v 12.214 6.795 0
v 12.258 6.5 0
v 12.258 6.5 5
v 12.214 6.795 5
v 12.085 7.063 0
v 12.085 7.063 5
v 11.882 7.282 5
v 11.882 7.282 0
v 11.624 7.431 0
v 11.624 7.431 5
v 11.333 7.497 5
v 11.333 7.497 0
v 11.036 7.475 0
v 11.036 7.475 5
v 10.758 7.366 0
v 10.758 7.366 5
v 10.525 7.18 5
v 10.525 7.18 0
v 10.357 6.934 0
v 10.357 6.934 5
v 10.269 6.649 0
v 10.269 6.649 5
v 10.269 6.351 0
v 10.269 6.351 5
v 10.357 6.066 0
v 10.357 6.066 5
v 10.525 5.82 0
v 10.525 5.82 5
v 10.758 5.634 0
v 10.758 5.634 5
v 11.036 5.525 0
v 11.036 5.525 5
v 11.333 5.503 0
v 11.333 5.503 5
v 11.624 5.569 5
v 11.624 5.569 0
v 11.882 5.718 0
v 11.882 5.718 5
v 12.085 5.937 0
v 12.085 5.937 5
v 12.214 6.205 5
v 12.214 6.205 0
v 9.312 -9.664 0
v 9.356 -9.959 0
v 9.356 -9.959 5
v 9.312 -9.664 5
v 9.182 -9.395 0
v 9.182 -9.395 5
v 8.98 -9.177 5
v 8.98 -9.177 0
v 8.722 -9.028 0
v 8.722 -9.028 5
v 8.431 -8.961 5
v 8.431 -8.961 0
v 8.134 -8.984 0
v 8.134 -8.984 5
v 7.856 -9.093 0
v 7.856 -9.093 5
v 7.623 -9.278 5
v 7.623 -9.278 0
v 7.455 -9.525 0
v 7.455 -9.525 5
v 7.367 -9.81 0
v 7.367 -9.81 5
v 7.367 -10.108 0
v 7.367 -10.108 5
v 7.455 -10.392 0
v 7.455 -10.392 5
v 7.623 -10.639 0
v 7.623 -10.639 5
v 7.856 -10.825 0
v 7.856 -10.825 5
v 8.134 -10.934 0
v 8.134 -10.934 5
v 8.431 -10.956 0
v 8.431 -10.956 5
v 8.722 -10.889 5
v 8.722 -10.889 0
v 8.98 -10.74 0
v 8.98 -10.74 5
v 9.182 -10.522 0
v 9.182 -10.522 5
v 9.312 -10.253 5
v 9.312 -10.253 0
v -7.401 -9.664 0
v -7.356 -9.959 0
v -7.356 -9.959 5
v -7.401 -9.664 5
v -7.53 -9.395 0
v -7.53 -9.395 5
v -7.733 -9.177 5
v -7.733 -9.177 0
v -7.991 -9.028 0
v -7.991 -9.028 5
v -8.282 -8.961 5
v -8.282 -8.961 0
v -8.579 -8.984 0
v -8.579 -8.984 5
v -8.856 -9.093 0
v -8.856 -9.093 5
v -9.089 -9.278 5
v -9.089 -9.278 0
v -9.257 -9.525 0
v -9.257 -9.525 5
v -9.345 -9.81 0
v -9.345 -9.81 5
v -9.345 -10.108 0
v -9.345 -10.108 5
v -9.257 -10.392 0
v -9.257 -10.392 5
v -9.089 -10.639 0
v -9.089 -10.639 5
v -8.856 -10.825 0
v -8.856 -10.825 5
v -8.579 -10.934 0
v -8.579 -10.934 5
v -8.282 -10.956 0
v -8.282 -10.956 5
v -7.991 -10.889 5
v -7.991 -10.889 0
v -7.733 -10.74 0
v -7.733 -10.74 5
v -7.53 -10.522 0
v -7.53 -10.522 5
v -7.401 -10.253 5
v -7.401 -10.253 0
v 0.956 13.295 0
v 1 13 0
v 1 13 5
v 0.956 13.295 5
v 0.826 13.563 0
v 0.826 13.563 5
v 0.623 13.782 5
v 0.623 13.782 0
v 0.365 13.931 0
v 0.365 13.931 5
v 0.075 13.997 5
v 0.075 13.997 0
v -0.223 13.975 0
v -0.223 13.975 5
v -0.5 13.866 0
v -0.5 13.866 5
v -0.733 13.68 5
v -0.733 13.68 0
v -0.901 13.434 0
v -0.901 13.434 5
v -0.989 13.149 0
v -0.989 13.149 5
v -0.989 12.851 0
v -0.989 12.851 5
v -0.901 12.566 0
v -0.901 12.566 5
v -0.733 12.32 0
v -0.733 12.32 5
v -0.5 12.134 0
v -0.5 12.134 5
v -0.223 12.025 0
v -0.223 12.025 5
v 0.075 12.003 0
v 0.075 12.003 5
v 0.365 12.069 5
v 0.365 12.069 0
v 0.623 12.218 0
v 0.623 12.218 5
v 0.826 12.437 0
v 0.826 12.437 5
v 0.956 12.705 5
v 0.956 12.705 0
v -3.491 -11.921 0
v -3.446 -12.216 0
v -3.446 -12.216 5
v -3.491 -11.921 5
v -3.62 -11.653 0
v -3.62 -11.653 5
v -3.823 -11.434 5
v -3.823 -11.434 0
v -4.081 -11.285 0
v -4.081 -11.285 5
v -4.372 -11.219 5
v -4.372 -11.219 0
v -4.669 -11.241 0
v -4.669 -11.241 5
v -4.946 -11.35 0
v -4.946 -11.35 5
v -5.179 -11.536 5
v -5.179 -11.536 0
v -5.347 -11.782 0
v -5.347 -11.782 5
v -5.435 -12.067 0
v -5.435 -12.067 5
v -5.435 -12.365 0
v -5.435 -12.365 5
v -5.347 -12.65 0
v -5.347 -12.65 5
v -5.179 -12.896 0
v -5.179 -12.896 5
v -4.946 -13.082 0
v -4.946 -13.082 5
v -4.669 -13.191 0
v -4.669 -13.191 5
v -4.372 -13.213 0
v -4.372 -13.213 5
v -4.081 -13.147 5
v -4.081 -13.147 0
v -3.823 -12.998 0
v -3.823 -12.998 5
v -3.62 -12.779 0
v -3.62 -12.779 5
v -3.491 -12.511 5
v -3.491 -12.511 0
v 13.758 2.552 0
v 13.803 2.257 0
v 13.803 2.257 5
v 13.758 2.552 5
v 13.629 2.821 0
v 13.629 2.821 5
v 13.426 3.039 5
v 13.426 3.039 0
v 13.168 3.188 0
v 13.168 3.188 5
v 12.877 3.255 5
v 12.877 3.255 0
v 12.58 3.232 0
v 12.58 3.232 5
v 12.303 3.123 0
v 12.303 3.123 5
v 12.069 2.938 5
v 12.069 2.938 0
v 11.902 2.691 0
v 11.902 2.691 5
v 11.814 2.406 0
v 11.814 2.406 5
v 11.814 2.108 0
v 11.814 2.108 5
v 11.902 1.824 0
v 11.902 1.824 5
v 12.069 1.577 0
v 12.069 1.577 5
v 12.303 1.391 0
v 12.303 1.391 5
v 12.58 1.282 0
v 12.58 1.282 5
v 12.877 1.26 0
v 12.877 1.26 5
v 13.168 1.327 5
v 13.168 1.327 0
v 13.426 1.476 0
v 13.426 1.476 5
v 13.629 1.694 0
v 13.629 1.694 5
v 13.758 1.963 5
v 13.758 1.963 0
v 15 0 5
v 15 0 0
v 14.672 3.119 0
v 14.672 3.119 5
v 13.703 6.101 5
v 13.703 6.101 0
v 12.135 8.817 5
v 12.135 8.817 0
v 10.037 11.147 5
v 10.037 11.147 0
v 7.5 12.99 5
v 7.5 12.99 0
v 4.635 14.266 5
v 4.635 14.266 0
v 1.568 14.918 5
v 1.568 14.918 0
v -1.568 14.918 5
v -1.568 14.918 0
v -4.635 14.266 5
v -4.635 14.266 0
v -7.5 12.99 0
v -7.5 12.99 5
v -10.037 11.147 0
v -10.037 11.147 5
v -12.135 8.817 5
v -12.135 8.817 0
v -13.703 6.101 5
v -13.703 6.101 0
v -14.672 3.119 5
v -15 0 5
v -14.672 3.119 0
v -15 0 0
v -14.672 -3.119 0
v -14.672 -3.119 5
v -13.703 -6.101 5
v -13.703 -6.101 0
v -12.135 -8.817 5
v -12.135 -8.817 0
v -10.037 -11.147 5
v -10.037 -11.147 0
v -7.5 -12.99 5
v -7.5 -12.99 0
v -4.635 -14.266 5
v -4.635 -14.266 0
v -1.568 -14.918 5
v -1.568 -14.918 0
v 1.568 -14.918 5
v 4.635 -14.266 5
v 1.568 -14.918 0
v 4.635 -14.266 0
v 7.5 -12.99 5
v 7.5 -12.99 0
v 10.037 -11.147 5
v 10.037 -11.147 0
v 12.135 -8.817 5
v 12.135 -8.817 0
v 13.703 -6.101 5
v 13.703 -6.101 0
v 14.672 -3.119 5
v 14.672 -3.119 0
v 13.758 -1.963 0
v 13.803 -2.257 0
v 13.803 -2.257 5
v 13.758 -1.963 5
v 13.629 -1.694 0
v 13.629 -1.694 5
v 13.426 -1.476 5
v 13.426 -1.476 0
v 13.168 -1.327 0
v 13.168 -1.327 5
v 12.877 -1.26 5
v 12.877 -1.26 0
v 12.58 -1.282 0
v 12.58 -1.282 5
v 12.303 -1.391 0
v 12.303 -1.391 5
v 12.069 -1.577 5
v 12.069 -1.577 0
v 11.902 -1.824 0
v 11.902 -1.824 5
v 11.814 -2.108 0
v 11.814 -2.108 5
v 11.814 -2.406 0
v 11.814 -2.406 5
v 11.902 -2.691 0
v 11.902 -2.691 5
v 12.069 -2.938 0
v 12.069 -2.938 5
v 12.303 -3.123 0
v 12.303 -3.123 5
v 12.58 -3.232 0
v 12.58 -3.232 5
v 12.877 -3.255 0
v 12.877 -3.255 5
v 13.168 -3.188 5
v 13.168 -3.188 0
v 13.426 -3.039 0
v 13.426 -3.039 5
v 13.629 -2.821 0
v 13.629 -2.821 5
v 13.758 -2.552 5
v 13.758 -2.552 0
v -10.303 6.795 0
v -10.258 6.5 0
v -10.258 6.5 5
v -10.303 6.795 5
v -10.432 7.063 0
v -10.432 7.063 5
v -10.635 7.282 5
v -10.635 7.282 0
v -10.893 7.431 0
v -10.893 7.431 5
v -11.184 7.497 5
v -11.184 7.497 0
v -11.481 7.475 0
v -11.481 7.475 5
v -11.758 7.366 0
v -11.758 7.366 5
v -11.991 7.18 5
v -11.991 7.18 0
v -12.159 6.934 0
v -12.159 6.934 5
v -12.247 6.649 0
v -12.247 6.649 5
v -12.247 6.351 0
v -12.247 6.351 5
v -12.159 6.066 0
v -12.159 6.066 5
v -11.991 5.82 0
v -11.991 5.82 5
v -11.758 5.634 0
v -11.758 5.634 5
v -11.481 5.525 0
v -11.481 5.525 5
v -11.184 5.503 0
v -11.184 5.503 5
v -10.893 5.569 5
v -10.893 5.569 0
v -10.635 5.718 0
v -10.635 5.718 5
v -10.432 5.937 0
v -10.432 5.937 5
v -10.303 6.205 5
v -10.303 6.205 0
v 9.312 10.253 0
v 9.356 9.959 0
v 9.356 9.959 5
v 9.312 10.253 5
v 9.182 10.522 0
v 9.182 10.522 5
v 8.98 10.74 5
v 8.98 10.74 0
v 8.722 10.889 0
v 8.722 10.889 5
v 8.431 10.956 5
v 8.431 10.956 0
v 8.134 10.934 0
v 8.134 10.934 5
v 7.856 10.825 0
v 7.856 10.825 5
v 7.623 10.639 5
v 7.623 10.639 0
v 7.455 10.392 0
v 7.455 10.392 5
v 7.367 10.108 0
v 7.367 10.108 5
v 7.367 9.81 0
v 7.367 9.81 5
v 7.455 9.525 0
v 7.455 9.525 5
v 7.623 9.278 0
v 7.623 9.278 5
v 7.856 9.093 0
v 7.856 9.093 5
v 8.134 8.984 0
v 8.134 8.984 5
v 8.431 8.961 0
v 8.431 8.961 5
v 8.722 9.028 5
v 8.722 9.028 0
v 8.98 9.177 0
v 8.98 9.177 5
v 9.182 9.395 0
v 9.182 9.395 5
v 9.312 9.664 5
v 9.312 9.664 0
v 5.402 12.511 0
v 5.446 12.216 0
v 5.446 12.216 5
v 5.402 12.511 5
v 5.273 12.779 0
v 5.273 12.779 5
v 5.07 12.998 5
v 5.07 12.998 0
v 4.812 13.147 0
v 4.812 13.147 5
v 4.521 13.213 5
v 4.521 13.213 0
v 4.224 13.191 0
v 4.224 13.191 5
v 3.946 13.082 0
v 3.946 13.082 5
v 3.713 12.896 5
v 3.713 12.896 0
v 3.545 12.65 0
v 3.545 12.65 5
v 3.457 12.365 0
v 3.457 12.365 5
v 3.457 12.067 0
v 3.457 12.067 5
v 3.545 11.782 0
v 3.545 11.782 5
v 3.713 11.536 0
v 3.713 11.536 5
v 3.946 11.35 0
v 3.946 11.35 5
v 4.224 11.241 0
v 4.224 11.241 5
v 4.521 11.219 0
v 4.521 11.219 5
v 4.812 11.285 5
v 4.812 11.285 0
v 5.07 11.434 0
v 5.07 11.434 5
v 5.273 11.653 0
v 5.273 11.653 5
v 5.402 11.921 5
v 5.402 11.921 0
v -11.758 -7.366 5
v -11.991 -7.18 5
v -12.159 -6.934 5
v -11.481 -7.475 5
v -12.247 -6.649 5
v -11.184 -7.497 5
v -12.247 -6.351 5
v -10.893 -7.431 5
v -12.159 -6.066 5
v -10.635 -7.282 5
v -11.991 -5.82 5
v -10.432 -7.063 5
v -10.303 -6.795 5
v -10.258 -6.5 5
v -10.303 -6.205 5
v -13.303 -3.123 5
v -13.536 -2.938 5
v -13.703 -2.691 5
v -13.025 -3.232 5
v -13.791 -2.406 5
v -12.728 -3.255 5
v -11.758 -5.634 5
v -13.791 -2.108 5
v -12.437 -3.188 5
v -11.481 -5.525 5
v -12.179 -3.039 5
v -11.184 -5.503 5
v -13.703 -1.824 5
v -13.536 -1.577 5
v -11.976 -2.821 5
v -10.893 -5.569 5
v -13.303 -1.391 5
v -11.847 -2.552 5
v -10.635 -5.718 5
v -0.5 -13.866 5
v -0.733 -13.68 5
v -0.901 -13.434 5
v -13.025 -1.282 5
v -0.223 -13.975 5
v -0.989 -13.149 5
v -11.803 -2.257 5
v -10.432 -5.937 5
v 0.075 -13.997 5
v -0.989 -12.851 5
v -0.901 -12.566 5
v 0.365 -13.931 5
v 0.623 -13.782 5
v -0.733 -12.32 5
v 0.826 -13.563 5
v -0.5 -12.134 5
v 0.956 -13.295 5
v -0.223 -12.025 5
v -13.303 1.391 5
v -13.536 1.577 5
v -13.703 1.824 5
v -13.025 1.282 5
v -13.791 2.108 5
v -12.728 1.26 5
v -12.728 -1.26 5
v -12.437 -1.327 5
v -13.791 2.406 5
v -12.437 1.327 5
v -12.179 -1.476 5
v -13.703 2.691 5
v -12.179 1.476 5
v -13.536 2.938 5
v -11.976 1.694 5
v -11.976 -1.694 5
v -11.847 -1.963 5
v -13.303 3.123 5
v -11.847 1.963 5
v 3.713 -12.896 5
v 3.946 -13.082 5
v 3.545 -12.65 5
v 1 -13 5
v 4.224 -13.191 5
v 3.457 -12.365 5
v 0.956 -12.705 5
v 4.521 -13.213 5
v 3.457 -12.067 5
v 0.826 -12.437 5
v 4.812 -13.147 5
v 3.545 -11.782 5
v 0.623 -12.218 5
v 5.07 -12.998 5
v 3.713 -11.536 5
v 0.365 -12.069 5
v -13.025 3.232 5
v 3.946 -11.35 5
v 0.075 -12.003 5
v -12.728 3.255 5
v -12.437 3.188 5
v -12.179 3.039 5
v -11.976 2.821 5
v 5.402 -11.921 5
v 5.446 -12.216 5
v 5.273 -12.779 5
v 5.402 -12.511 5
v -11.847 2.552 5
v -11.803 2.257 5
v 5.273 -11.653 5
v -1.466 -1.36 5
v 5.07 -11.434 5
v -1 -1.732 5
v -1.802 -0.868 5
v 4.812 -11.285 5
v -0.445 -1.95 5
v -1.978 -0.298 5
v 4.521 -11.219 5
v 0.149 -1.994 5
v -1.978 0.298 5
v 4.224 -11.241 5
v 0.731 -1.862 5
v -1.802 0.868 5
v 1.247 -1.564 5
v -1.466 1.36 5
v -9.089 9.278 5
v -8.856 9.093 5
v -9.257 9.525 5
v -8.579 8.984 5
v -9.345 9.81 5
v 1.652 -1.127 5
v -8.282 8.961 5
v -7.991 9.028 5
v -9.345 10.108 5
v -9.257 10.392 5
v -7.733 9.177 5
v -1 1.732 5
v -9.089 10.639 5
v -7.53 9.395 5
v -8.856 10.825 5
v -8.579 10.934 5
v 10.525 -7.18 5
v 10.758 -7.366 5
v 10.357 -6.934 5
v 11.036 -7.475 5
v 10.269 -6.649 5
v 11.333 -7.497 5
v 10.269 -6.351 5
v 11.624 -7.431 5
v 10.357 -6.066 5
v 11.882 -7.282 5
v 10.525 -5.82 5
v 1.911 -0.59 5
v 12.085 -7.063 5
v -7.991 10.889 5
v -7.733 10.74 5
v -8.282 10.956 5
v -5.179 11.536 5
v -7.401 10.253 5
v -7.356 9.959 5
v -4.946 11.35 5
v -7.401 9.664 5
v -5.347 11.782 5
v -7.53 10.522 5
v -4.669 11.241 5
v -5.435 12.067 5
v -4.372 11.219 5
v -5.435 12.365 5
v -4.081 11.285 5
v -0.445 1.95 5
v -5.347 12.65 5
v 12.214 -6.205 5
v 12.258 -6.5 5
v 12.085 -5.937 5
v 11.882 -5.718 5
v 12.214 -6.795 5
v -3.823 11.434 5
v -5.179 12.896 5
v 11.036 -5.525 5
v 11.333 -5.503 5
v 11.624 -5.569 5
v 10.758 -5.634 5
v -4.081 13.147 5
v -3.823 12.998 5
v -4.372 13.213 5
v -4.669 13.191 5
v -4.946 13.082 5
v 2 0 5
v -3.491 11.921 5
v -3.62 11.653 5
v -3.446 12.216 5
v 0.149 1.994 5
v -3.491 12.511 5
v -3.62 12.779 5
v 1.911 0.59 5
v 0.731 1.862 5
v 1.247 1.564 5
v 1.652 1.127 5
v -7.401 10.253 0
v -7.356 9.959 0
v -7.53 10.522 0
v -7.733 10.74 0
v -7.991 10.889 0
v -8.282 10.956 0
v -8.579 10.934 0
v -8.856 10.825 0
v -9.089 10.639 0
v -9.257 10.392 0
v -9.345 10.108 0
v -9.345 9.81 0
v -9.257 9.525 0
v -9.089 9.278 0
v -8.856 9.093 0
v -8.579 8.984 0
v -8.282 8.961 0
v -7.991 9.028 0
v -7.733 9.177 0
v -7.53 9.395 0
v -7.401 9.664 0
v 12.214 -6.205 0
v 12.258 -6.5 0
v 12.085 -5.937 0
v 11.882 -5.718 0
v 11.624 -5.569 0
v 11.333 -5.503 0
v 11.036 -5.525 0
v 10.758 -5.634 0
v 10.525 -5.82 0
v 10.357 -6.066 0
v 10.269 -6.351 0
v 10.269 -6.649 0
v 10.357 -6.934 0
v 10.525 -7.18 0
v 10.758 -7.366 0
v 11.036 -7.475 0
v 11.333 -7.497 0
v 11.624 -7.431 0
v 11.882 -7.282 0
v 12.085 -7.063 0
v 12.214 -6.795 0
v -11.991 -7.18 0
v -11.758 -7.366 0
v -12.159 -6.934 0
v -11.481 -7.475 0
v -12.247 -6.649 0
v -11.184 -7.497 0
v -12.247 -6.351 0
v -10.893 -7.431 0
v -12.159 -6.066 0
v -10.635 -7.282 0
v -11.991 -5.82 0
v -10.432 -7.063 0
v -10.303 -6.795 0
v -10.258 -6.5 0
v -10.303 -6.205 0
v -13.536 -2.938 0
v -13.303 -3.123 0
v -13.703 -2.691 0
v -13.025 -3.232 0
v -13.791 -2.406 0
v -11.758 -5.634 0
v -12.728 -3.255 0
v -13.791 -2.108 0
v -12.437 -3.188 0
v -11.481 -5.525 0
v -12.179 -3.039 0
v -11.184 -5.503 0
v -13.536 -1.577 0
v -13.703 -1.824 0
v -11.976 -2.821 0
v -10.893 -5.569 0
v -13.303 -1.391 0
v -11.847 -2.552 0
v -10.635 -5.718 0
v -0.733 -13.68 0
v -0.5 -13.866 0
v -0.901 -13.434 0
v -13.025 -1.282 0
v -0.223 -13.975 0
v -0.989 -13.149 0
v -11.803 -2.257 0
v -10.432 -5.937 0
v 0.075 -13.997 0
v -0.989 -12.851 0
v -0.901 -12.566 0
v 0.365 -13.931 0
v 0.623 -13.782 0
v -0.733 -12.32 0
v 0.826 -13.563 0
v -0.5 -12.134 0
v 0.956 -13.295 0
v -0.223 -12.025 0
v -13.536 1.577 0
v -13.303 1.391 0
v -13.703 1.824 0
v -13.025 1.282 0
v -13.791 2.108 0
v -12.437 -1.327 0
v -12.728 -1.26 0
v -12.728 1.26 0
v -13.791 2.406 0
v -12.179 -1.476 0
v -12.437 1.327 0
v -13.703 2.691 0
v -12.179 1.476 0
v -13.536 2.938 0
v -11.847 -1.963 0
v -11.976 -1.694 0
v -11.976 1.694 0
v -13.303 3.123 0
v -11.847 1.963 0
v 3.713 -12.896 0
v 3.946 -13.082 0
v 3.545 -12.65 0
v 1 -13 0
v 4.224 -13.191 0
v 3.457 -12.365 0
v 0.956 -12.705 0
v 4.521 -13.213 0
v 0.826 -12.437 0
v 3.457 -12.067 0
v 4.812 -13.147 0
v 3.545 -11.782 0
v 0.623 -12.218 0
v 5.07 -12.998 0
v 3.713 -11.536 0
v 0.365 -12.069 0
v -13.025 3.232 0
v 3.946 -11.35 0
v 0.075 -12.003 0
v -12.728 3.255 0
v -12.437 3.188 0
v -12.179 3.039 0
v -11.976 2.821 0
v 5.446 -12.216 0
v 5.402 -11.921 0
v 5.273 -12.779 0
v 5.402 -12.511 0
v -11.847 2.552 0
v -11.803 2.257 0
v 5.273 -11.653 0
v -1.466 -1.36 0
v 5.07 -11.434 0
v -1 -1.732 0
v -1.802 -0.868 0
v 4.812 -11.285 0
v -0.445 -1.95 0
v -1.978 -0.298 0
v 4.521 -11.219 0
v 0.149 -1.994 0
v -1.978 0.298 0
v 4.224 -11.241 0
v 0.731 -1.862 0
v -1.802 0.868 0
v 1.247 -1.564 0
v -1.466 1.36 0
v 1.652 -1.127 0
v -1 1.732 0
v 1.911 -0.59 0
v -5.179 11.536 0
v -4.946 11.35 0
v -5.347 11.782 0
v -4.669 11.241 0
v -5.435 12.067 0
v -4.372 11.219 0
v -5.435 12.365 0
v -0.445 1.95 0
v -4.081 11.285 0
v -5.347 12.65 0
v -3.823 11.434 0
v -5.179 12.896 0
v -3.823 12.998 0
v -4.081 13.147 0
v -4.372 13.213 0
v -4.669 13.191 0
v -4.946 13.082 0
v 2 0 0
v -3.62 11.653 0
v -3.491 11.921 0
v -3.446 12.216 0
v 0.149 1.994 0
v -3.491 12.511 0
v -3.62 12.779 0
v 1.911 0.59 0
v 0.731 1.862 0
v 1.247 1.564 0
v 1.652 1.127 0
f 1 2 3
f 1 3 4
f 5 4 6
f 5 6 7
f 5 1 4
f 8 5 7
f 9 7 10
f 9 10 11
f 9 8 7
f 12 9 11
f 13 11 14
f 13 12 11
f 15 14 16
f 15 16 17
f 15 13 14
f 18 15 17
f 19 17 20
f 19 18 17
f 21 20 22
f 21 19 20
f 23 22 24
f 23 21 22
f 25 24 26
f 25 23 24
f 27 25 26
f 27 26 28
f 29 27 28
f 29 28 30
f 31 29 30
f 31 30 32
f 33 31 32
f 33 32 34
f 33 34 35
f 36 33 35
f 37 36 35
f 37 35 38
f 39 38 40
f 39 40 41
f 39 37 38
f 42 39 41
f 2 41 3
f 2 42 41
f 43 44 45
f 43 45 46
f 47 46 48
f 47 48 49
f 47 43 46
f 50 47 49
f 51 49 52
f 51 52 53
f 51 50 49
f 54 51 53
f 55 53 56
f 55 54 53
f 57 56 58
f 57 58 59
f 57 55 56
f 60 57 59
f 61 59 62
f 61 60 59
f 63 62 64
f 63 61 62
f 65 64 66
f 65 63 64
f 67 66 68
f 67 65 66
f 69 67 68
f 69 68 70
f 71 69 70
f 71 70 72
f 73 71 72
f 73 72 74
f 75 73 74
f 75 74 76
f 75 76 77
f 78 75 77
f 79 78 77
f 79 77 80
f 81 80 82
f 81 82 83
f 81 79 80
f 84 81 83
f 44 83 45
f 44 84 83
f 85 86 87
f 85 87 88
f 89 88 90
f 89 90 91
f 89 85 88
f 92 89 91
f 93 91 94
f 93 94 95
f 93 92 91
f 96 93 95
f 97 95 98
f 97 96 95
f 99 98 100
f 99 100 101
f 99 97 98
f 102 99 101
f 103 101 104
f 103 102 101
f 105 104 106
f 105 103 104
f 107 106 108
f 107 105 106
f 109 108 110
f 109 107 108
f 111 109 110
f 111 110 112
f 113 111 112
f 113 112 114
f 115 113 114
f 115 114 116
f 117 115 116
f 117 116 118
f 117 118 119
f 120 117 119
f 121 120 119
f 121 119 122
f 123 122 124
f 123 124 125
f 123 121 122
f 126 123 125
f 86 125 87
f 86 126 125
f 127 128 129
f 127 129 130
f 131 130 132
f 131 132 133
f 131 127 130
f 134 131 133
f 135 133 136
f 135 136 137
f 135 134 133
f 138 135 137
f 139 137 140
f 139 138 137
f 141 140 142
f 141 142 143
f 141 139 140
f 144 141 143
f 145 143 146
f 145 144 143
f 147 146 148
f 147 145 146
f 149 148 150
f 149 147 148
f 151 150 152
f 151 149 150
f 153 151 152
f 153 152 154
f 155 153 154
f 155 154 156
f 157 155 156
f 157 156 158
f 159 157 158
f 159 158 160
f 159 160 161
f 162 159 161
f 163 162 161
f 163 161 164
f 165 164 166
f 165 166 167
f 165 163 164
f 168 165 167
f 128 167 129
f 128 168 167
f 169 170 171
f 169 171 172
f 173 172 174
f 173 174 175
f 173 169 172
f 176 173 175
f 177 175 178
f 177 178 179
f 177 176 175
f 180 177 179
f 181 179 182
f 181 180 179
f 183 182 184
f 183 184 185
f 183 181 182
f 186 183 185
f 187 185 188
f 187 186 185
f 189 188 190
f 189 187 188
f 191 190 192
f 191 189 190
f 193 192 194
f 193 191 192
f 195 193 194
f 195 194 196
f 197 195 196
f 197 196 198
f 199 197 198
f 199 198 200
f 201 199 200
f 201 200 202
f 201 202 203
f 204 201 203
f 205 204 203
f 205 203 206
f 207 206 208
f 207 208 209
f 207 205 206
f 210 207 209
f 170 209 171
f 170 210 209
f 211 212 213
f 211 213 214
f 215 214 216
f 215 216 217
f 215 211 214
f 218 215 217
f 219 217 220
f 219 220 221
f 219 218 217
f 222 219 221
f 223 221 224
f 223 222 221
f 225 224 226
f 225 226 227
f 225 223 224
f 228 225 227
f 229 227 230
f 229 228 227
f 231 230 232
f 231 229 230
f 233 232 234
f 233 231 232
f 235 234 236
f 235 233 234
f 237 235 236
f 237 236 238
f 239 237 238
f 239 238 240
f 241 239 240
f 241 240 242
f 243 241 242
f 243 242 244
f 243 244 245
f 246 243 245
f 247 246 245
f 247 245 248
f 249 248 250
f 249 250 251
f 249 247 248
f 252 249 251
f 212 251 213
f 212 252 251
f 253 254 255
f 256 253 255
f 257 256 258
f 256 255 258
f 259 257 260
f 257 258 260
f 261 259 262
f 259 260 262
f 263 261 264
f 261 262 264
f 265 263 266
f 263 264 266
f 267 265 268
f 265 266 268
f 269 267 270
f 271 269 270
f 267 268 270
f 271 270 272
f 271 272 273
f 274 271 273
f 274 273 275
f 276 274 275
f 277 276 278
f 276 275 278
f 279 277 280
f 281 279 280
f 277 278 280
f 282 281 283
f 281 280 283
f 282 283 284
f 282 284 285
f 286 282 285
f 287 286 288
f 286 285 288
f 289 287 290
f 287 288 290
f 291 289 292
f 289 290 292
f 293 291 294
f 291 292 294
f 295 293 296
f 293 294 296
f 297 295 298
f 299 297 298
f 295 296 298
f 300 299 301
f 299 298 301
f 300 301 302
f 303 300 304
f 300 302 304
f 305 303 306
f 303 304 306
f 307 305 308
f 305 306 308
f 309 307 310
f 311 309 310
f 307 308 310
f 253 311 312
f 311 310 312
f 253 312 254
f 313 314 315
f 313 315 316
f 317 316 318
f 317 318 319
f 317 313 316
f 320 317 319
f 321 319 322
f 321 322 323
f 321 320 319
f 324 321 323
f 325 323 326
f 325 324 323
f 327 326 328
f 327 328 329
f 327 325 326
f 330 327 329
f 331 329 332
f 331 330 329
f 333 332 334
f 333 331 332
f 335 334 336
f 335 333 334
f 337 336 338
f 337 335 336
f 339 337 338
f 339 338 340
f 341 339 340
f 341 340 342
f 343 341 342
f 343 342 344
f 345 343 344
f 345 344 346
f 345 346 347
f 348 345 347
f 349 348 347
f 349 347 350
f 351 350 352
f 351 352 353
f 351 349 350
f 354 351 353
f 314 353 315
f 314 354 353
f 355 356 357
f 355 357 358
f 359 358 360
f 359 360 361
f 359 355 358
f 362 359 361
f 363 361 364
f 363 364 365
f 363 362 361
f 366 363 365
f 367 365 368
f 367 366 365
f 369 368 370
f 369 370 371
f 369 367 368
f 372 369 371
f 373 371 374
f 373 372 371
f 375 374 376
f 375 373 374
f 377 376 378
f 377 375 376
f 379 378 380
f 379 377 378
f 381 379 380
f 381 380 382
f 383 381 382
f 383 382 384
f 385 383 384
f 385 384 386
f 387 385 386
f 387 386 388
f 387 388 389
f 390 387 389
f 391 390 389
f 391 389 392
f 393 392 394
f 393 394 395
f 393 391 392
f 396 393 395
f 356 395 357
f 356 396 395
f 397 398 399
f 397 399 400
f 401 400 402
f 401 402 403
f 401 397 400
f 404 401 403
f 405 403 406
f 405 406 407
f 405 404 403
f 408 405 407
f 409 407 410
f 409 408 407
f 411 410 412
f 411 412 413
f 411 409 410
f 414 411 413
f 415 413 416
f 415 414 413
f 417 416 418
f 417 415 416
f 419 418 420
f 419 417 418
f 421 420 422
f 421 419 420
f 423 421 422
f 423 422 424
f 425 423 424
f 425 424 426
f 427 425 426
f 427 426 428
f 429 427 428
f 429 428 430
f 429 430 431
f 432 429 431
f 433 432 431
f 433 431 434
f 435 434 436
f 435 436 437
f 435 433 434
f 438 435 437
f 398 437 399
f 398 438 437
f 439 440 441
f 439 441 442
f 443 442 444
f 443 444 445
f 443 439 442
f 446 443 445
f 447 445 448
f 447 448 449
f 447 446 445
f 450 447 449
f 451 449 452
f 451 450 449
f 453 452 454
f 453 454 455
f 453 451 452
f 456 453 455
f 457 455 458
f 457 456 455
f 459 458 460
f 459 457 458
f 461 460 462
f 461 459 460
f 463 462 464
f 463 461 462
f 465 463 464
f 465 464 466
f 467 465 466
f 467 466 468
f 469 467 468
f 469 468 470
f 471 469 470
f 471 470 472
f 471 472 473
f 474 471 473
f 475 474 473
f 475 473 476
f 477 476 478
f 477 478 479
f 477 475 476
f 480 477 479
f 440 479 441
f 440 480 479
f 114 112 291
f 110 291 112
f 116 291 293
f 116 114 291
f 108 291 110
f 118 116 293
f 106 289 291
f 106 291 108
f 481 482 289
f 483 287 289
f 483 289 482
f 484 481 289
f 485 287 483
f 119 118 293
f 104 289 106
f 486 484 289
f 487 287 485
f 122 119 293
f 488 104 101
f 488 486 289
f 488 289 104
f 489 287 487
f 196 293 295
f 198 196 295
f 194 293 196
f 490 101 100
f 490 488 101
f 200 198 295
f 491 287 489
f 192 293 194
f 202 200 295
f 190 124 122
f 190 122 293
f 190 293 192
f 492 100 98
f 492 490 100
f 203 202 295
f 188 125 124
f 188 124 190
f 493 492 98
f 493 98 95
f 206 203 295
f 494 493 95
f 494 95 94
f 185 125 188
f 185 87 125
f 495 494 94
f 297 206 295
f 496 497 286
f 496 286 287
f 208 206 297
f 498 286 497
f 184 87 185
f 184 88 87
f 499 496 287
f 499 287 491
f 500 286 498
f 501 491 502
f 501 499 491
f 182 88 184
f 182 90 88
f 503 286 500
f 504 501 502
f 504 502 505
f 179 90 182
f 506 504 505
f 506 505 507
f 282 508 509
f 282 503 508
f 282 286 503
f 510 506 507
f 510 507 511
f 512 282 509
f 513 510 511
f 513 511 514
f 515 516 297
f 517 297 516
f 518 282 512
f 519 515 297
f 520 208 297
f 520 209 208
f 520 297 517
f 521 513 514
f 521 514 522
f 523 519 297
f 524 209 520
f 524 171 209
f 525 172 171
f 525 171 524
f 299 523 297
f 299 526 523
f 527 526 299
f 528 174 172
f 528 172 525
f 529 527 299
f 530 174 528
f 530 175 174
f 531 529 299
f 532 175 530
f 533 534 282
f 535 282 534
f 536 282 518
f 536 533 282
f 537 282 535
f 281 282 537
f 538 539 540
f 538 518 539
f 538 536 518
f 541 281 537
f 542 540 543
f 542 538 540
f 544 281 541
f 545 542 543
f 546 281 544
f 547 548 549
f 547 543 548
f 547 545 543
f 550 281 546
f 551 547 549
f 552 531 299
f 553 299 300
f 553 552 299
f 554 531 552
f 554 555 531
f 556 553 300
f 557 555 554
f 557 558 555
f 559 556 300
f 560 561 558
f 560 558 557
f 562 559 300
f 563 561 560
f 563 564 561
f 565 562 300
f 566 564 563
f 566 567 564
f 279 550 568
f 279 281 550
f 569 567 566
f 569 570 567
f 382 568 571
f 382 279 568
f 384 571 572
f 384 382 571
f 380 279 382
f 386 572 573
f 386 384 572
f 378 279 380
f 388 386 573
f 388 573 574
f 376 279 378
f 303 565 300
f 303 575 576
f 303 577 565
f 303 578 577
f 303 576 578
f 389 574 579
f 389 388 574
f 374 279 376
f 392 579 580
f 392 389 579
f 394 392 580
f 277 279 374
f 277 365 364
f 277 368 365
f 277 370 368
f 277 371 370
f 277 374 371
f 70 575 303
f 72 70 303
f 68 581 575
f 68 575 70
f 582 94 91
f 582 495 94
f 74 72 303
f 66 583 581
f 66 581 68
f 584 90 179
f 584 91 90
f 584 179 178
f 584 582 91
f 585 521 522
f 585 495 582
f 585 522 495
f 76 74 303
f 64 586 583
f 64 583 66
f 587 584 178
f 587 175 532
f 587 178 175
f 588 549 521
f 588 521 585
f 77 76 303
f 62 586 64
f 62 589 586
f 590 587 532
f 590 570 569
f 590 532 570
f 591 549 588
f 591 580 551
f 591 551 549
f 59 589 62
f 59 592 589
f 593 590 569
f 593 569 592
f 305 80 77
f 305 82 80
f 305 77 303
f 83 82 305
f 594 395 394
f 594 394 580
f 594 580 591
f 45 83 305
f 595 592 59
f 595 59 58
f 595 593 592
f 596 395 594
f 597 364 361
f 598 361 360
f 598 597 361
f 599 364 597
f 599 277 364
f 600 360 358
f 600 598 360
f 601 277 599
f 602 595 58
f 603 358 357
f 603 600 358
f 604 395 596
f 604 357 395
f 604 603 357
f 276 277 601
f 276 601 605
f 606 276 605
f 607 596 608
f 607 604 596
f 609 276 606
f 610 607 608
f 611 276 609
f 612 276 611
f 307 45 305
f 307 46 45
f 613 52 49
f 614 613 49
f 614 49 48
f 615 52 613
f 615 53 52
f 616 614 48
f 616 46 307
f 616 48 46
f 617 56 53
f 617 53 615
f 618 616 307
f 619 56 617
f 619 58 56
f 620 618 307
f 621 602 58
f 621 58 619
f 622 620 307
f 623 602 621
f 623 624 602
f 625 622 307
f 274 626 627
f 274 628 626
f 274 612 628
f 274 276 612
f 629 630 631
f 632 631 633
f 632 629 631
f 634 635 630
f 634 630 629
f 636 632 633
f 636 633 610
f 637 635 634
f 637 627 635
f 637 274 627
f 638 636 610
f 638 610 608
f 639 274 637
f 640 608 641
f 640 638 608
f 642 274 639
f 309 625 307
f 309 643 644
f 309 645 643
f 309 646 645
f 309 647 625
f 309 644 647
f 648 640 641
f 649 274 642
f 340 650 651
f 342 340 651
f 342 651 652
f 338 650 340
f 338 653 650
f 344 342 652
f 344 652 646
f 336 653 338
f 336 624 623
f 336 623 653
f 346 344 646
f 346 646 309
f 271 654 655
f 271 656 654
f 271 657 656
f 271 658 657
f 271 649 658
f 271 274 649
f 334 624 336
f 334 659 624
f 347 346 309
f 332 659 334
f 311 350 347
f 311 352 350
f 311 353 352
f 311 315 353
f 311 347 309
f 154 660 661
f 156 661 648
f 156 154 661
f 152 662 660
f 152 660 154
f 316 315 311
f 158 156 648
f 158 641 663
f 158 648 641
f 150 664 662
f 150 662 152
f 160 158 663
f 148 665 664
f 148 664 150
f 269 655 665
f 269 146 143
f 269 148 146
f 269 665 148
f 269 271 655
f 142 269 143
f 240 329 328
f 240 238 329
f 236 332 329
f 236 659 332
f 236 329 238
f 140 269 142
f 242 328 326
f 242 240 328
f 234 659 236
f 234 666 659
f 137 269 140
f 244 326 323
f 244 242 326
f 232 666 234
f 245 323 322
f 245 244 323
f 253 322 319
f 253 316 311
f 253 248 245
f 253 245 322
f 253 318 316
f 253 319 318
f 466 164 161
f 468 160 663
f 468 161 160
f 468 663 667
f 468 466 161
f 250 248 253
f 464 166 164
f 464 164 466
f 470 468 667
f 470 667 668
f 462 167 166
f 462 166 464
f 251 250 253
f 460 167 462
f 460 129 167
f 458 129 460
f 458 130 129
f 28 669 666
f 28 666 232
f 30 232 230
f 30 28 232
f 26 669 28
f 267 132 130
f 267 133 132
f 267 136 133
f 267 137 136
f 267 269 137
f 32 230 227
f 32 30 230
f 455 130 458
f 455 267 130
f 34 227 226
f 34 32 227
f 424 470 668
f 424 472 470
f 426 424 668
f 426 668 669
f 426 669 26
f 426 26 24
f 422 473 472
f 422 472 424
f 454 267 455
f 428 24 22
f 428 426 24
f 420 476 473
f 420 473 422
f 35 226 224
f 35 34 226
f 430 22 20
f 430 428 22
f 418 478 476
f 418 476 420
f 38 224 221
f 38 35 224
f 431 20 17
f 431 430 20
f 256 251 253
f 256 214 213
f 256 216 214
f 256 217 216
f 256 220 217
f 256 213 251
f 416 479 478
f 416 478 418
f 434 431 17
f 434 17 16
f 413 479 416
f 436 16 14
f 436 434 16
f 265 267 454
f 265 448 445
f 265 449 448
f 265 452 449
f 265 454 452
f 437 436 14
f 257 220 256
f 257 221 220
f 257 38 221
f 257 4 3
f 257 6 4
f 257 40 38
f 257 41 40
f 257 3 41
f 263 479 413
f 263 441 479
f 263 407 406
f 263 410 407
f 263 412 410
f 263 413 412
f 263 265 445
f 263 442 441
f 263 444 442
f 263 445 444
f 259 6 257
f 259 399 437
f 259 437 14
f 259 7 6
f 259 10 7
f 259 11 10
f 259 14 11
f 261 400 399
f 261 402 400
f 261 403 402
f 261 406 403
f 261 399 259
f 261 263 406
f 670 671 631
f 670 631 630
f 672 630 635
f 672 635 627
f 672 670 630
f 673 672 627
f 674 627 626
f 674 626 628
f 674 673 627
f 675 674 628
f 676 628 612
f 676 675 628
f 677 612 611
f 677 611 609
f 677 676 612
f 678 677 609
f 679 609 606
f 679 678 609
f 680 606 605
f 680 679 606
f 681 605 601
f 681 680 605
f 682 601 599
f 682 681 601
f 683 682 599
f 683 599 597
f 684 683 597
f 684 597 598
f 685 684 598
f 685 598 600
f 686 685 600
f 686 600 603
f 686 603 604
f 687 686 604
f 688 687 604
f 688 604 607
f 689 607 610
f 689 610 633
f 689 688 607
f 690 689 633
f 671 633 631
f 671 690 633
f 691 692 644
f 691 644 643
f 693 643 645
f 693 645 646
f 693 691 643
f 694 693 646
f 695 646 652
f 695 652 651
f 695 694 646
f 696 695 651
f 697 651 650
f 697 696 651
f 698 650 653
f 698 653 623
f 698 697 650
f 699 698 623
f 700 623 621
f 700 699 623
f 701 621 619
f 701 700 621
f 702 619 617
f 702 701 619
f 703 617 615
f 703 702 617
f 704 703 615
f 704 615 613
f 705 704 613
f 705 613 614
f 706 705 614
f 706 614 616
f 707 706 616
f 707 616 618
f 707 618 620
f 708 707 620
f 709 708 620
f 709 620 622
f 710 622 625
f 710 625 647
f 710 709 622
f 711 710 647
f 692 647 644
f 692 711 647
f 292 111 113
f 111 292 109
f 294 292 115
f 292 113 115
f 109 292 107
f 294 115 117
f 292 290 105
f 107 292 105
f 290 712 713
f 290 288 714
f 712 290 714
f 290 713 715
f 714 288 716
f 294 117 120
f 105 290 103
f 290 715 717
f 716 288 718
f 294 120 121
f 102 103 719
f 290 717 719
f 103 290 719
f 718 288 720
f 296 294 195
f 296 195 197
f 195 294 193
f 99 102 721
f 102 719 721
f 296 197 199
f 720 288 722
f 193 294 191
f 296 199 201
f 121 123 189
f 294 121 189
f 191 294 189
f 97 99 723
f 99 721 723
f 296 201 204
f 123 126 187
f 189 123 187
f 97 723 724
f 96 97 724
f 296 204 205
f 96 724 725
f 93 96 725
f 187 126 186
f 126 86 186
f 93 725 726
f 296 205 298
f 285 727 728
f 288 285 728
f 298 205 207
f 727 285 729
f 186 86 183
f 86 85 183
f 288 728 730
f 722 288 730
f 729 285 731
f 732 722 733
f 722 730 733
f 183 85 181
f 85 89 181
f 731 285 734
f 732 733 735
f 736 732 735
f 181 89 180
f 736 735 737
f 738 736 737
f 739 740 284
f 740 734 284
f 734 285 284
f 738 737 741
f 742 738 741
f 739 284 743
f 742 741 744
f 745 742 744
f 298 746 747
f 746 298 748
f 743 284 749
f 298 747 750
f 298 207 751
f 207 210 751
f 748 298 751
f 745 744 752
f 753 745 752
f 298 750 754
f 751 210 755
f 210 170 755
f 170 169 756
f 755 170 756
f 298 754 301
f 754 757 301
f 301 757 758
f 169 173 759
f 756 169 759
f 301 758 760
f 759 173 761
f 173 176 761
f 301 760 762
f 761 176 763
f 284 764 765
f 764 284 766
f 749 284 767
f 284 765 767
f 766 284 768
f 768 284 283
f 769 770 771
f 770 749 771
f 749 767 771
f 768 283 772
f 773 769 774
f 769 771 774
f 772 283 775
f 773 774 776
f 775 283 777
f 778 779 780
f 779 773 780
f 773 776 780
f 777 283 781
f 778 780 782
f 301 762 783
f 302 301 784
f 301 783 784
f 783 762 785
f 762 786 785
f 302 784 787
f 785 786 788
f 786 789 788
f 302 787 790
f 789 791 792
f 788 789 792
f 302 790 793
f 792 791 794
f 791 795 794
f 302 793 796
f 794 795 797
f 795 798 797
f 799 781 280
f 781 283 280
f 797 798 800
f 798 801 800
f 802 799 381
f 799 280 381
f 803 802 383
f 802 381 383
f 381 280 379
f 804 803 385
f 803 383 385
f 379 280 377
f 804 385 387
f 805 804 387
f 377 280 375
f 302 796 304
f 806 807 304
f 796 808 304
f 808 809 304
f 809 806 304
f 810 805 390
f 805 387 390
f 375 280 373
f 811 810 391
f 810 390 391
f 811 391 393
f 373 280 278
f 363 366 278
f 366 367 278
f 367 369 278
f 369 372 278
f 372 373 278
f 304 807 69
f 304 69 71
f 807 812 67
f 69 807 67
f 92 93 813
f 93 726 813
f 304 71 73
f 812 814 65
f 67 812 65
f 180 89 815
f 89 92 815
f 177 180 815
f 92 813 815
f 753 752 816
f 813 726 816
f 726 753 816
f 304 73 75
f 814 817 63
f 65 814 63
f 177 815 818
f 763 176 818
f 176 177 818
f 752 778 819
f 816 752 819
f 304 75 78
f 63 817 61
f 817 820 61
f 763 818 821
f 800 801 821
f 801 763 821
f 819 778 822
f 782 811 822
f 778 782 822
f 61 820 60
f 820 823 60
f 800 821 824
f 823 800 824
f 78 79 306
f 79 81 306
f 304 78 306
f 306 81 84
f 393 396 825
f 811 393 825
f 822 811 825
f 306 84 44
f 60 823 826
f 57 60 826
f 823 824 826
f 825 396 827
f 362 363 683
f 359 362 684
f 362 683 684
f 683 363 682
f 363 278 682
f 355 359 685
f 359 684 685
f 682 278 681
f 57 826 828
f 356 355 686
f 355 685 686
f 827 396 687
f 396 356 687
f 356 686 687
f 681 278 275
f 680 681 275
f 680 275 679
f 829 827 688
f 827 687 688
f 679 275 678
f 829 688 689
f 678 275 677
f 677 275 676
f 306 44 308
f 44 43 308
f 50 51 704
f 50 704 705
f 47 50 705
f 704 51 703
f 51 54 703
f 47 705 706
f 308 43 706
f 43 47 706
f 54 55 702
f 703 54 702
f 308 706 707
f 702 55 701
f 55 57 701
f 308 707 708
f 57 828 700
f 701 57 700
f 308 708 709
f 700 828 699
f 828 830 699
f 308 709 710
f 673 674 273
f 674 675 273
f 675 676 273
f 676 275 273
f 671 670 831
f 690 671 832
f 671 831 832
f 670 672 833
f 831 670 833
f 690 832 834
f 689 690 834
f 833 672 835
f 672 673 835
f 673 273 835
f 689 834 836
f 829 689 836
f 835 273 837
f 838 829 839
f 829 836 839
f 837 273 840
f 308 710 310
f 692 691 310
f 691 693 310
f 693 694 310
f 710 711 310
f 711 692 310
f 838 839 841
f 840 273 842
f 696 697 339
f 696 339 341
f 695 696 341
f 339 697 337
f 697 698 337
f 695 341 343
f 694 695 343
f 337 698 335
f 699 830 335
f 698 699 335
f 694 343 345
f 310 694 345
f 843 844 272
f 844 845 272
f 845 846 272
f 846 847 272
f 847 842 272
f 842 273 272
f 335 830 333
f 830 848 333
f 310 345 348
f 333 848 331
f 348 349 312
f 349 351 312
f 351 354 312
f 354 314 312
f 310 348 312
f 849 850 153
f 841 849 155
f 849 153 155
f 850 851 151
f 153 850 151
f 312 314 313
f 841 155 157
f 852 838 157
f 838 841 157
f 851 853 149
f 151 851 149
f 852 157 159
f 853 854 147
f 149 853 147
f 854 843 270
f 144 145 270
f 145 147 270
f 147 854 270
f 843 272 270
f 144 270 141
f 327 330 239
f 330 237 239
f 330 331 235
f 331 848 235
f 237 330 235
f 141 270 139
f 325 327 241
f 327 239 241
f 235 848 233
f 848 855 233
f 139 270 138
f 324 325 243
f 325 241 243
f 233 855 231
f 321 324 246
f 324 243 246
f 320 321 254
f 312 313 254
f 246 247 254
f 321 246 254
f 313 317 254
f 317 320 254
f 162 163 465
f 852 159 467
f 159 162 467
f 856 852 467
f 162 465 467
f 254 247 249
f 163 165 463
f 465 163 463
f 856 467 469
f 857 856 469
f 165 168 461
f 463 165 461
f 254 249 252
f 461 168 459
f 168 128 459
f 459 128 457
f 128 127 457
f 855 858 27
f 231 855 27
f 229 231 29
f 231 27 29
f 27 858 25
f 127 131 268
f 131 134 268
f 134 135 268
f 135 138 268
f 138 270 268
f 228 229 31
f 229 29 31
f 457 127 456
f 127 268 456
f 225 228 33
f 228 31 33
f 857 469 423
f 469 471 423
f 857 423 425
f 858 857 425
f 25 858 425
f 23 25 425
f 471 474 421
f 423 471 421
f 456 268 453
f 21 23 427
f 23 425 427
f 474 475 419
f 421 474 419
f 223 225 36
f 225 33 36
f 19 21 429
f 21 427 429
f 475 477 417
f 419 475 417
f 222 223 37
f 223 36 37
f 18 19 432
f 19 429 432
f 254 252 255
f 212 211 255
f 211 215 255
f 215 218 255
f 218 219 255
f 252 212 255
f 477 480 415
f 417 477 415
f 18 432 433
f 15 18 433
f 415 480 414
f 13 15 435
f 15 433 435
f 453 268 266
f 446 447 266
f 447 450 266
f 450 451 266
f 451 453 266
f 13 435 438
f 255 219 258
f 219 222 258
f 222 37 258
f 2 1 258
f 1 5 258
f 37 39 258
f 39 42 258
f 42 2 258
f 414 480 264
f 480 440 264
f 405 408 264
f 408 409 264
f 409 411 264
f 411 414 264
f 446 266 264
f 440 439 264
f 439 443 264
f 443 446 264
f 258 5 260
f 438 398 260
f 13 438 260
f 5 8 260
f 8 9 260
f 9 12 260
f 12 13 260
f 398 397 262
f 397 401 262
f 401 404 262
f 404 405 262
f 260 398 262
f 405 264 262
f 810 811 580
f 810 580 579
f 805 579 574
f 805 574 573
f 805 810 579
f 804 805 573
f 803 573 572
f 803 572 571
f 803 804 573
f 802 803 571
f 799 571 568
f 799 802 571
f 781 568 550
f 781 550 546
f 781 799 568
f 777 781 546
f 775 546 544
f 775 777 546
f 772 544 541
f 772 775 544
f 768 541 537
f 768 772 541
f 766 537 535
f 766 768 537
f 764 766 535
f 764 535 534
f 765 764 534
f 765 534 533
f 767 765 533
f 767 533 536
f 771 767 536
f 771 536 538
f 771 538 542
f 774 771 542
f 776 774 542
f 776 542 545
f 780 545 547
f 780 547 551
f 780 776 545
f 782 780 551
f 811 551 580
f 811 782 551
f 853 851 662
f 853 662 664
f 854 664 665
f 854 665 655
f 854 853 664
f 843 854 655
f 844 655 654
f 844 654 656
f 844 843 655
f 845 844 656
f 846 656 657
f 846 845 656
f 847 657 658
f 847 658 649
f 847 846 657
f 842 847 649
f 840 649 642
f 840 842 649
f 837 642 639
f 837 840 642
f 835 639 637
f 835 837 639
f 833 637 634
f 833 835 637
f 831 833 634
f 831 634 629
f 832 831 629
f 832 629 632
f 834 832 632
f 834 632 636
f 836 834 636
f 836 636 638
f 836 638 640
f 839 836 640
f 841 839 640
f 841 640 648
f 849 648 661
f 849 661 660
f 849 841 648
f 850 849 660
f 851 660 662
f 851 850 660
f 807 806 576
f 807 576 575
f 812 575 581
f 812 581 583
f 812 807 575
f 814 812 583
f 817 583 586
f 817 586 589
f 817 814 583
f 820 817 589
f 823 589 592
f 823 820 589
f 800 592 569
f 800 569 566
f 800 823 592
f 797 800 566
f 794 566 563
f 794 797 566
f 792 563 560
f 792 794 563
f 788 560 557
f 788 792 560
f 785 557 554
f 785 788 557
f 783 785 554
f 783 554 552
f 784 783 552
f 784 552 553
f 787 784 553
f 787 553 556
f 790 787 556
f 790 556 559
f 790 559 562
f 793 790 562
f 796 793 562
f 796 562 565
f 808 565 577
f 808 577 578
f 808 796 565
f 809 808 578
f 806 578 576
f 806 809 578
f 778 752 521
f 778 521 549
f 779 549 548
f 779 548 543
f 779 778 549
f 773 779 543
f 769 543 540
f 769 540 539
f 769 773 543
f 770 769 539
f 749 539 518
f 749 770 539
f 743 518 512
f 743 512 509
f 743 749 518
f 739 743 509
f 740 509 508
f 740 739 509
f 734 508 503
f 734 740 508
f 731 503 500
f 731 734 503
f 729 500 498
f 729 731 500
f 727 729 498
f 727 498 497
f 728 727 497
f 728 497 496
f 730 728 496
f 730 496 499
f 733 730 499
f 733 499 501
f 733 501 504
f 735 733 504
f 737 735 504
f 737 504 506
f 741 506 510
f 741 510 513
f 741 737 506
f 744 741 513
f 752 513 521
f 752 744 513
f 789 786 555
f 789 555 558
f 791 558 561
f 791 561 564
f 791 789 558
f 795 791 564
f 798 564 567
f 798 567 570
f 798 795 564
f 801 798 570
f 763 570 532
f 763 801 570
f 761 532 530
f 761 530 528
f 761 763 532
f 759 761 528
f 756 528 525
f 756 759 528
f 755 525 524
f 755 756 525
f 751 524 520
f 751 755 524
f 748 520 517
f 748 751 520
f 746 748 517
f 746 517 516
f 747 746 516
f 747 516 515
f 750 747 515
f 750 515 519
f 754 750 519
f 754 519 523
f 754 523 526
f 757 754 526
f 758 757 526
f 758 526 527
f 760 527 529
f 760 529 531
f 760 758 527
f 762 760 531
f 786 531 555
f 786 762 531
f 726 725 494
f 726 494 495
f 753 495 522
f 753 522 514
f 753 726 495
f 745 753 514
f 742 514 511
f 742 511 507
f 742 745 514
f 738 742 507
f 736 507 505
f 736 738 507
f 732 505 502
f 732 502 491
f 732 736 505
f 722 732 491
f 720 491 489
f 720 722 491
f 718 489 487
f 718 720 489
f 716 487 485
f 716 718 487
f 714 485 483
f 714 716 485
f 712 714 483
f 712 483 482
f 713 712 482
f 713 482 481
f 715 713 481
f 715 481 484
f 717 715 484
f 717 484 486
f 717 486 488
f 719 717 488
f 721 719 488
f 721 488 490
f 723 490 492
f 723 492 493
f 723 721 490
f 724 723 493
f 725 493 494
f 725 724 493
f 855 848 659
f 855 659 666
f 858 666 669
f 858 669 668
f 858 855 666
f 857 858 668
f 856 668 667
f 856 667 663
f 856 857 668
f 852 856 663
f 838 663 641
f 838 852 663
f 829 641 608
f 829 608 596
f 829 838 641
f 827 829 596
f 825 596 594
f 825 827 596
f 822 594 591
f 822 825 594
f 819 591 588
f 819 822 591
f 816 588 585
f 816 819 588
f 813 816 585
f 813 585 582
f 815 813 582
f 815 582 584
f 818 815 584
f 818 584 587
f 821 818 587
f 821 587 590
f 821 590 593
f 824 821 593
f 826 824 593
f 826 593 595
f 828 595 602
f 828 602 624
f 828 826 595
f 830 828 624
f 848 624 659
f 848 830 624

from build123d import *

# Parameters (mm, degrees)
F0_R          = 15
F3_DEPTH      = 5
F1_R          = 1
F4_DEPTH      = 5
F4_DEPTH_BACK = 1
F2_R          = 2
F5_DEPTH      = 5


with BuildPart() as f3:
    # F0 (on Top) → F3 (new body)
    with BuildSketch(Plane.XY):
        Circle(F0_R)
    extrude(amount=F3_DEPTH)

    # F1 (on Top) → F4 (cut, two sides)
    with BuildSketch(Plane.XY) as f4_sk:
        with Locations((0, 13)):
            Circle(F1_R)
        with Locations((-4.446262, 12.216004)):
            Circle(F1_R)
        with Locations((-8.356239, 9.958578)):
            Circle(F1_R)
        with Locations((-11.25833, 6.5)):
            Circle(F1_R)
        with Locations((-12.802501, 2.257426)):
            Circle(F1_R)
        with Locations((-12.802501, -2.257426)):
            Circle(F1_R)
        with Locations((-11.25833, -6.5)):
            Circle(F1_R)
        with Locations((-8.356239, -9.958578)):
            Circle(F1_R)
        with Locations((-4.446262, -12.216004)):
            Circle(F1_R)
        with Locations((0, -13)):
            Circle(F1_R)
        with Locations((4.446262, -12.216004)):
            Circle(F1_R)
        with Locations((8.356239, -9.958578)):
            Circle(F1_R)
        with Locations((11.25833, -6.5)):
            Circle(F1_R)
        with Locations((12.802501, -2.257426)):
            Circle(F1_R)
        with Locations((12.802501, 2.257426)):
            Circle(F1_R)
        with Locations((11.25833, 6.5)):
            Circle(F1_R)
        with Locations((8.356239, 9.958578)):
            Circle(F1_R)
        with Locations((4.446262, 12.216004)):
            Circle(F1_R)
    extrude(amount=F4_DEPTH, mode=Mode.SUBTRACT)
    extrude(f4_sk.sketch, amount=-F4_DEPTH_BACK, mode=Mode.SUBTRACT)

    # F2 (on Top) → F5 (cut)
    with BuildSketch(Plane.XY):
        Circle(F2_R)
    extrude(amount=F5_DEPTH, mode=Mode.SUBTRACT)


solid = f3.part
